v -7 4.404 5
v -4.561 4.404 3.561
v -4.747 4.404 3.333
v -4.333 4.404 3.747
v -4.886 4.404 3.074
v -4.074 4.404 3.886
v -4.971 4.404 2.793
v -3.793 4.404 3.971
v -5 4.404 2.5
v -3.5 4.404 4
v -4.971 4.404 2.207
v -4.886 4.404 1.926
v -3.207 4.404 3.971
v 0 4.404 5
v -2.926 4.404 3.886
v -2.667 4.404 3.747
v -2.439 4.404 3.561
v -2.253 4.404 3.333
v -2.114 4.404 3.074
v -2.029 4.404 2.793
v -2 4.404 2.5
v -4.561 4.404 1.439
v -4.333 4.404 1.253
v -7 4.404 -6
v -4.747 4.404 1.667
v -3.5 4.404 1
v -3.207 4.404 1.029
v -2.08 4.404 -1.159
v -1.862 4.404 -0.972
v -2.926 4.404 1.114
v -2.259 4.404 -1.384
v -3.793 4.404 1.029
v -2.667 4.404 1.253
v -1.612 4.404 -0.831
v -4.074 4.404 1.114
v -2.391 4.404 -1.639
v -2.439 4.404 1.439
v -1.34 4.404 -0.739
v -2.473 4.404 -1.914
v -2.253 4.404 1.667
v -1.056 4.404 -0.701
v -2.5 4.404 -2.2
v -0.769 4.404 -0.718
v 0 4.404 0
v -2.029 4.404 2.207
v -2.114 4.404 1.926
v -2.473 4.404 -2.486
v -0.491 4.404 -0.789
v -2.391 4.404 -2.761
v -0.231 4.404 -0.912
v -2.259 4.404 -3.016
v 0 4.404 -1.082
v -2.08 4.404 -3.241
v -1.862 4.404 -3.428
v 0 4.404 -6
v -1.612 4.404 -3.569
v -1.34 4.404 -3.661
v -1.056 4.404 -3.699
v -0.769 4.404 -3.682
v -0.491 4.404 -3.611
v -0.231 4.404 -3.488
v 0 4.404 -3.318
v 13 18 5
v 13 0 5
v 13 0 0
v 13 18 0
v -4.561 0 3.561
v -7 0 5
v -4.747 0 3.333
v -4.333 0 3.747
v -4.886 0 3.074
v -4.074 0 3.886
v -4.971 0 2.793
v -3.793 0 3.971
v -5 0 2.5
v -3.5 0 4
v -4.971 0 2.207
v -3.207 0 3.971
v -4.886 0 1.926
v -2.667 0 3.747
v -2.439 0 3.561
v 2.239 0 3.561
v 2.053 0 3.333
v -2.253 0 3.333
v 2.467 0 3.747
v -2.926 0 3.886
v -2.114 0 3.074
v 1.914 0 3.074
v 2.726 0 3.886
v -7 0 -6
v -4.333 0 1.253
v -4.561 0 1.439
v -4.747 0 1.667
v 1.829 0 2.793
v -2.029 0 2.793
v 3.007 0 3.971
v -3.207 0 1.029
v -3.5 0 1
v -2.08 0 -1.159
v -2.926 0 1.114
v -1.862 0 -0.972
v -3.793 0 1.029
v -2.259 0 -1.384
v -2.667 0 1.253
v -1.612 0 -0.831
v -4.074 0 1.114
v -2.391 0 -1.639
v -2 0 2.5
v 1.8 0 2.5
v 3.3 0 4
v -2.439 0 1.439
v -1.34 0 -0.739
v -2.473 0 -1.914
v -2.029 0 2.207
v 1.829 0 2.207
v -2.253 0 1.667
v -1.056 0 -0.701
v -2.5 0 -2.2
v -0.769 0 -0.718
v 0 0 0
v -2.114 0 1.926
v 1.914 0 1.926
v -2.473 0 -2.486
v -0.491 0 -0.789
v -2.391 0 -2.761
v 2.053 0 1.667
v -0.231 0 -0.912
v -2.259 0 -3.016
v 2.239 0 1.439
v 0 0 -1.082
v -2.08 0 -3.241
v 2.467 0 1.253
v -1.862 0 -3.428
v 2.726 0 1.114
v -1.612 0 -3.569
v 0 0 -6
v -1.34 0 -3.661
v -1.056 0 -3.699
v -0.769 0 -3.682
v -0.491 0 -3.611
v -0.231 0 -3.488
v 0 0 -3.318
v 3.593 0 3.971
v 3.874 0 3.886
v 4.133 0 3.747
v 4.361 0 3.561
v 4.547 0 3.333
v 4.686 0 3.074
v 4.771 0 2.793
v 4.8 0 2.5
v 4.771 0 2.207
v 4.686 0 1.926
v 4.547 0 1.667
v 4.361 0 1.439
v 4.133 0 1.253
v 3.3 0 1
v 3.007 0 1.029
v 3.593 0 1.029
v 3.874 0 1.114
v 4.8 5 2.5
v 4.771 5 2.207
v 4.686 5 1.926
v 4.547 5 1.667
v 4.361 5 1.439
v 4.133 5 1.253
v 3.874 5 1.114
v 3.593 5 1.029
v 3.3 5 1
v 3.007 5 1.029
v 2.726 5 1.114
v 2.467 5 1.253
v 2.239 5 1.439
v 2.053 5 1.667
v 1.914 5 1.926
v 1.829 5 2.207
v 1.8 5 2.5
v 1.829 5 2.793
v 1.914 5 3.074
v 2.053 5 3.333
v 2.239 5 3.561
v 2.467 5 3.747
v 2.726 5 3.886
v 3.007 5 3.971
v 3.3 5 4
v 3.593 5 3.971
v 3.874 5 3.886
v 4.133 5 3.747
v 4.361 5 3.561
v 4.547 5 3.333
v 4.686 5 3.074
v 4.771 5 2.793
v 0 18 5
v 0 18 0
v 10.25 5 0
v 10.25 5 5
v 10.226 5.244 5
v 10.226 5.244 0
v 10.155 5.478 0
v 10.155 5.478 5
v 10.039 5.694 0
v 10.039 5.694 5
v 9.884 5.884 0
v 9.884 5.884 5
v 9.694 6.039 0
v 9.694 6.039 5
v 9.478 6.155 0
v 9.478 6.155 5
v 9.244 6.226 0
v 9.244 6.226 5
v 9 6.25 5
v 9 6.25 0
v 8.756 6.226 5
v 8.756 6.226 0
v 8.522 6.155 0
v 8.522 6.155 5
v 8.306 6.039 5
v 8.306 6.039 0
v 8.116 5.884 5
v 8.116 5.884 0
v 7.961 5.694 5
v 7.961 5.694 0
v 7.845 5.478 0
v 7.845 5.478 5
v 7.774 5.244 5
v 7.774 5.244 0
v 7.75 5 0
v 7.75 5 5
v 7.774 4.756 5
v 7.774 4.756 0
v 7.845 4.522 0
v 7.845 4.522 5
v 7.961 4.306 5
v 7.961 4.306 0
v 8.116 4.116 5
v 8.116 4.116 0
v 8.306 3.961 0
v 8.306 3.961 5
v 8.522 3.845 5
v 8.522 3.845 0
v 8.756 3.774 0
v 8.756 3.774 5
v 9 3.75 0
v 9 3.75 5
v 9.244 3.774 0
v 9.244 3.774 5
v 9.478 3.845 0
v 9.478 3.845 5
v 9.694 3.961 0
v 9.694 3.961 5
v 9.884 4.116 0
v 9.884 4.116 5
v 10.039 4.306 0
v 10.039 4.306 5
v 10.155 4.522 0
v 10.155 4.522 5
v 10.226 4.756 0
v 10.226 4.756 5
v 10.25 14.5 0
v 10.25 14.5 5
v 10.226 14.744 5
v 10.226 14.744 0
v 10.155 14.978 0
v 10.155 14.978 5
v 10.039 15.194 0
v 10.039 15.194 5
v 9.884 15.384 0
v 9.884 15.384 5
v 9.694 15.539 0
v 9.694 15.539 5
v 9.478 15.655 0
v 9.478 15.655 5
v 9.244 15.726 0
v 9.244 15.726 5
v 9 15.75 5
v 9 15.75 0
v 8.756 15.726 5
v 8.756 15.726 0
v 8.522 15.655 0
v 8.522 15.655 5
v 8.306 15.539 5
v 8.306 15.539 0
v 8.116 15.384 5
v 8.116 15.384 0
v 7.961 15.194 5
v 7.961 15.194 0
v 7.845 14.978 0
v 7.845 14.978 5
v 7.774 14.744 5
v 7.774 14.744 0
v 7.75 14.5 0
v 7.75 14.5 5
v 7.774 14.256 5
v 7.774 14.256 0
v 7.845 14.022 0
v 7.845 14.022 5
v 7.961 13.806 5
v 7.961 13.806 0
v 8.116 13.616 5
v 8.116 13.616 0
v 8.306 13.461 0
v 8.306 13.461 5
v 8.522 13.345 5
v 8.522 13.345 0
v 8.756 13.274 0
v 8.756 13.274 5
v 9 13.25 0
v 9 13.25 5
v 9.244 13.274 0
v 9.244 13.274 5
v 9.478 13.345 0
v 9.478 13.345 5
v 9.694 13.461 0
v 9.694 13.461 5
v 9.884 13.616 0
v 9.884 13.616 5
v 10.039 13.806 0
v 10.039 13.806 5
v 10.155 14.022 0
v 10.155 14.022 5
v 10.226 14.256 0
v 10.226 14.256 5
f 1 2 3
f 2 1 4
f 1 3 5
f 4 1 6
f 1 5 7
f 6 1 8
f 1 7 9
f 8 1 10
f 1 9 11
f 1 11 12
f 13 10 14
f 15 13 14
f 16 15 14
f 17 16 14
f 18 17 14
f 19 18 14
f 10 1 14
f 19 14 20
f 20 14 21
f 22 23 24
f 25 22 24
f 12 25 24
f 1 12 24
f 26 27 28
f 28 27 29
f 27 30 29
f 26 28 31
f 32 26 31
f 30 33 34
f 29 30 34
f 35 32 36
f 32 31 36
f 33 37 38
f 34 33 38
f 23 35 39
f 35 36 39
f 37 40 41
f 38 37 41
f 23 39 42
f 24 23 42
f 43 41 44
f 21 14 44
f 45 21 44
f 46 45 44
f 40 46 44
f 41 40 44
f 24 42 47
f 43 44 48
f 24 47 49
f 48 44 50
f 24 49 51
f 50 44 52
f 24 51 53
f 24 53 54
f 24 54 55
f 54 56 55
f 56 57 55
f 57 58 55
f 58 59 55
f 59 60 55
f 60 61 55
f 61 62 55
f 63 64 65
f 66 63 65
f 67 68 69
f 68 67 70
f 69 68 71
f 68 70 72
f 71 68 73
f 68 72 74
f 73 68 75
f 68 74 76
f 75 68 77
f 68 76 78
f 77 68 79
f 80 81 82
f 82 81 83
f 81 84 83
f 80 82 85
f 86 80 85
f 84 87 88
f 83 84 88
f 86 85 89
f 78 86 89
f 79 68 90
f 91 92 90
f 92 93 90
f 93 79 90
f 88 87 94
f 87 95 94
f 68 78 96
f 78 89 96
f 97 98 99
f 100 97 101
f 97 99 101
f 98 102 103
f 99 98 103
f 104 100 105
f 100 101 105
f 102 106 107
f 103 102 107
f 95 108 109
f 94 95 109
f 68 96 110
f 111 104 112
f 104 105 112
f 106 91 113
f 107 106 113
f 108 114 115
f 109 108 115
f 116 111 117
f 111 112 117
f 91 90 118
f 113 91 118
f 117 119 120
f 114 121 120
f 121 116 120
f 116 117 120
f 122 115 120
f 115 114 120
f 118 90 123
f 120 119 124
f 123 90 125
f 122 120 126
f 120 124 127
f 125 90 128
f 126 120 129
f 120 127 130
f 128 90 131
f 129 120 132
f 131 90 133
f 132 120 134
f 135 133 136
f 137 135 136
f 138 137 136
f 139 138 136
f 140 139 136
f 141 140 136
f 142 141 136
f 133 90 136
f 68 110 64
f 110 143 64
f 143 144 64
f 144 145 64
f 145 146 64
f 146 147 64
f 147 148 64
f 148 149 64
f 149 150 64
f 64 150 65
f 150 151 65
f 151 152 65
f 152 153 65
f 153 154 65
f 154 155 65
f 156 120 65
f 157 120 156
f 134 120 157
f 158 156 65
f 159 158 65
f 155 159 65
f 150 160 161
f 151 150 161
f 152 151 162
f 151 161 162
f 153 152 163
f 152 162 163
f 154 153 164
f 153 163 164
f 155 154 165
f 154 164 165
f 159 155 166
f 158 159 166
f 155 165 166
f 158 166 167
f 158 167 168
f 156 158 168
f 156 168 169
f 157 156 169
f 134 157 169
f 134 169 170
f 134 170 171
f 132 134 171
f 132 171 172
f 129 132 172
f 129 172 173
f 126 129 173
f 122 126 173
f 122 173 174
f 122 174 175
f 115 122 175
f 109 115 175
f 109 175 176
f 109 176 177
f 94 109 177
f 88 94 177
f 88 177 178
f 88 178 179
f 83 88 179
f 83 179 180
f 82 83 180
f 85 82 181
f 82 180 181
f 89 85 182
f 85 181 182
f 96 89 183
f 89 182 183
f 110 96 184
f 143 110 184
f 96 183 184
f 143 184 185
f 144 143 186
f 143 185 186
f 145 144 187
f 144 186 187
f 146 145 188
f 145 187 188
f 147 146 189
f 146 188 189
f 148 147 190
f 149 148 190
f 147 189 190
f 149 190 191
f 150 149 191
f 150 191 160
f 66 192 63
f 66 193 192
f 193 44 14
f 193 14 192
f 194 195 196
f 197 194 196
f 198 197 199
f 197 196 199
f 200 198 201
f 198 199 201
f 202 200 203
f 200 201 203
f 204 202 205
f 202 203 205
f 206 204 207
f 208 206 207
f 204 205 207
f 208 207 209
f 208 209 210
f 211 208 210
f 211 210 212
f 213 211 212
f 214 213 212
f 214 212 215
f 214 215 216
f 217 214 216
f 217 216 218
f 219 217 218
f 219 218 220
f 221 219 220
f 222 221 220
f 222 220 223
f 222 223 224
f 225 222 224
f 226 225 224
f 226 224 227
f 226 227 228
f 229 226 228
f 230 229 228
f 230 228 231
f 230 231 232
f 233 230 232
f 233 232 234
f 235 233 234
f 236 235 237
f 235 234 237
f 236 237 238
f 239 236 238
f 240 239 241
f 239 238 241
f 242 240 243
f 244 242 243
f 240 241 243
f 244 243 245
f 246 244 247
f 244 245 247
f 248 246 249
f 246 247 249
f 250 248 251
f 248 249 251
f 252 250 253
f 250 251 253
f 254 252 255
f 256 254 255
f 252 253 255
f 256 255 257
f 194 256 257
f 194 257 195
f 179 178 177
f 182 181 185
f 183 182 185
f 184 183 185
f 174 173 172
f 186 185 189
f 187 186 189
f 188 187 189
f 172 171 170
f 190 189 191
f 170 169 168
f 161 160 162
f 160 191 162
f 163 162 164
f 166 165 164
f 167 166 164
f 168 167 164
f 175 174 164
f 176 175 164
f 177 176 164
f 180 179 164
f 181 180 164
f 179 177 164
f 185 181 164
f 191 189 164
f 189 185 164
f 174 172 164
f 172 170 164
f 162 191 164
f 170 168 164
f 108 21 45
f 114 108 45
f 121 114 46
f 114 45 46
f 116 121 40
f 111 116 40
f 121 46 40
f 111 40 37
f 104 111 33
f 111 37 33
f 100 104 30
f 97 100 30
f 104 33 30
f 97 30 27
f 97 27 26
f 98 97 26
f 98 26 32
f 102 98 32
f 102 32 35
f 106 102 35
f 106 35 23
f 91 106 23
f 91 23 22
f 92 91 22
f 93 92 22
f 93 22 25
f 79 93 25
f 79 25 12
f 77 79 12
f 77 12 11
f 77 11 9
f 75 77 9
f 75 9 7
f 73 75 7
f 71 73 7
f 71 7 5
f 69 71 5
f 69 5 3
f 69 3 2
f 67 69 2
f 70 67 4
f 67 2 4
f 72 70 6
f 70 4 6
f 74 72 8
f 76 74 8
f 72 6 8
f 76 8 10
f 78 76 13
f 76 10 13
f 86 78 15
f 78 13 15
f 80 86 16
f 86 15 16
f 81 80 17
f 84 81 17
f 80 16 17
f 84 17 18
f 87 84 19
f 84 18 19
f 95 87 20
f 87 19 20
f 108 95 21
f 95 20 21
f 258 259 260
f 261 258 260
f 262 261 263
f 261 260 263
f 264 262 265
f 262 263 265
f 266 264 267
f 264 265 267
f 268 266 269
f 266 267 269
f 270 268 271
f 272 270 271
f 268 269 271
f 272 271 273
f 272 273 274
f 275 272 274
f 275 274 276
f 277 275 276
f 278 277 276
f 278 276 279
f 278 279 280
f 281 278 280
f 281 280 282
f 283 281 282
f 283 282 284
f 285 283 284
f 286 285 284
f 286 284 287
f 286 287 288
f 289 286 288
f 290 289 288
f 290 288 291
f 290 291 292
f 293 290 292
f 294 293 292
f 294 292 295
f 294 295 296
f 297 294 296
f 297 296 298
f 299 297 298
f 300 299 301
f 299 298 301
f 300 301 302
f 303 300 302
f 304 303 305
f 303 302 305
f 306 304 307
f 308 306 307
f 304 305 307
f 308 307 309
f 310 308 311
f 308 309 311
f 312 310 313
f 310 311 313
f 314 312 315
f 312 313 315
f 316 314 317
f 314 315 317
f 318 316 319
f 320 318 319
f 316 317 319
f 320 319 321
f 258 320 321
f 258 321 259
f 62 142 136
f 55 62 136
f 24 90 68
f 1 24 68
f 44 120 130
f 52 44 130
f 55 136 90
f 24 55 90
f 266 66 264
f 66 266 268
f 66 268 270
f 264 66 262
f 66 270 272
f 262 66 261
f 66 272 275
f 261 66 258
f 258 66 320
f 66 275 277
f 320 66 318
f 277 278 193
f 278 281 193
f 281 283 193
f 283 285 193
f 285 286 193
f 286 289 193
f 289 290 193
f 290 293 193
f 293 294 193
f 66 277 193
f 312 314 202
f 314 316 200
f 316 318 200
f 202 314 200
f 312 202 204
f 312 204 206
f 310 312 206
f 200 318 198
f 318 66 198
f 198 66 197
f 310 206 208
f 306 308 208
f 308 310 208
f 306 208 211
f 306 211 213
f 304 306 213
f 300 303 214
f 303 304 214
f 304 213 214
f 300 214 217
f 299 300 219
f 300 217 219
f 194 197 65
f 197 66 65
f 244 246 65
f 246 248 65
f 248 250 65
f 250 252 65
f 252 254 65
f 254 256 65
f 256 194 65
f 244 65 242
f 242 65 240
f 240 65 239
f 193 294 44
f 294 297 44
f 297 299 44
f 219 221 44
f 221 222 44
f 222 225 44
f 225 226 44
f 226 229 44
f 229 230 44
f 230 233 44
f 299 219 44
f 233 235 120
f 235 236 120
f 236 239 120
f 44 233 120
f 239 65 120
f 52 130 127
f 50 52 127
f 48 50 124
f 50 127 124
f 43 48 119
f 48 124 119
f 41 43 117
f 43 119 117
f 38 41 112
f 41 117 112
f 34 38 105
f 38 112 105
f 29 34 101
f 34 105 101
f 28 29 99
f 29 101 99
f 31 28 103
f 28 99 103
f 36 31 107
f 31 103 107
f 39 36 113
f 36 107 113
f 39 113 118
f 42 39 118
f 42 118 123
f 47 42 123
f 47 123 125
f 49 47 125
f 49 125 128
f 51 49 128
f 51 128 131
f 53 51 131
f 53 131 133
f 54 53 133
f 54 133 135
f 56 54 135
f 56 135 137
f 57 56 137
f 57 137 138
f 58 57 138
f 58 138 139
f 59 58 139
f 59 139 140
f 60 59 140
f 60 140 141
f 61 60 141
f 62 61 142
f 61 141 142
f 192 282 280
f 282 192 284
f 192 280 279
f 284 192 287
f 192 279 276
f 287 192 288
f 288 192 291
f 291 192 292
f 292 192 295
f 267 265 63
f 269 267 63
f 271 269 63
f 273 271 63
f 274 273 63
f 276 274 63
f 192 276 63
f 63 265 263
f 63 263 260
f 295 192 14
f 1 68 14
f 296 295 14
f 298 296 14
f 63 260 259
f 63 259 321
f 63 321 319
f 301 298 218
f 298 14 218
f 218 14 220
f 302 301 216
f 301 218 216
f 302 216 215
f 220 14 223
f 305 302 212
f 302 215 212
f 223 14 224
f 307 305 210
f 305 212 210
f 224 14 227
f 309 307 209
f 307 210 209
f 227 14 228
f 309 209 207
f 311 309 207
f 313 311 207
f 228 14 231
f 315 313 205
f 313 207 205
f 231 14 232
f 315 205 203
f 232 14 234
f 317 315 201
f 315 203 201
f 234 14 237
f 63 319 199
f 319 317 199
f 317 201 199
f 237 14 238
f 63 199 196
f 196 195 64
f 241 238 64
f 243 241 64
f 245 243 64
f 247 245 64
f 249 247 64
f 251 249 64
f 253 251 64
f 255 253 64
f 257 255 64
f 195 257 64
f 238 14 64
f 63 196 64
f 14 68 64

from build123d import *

# Parameters (mm, degrees)
BOSS_EXTRUDE1_DEPTH             = 18
SKETCH2_W                       = 6
SKETCH2_H                       = 13.595638642
CUT_EXTRUDE1_DEPTH              = 10
SKETCH3_W                       = 7
SKETCH3_H                       = 13.595638642
CUT_EXTRUDE2_DEPTH              = 10
SKETCH4_R                       = 1.5
CUT_EXTRUDE3_DEPTH              = 10
TAP_DRILL_FOR_M3X0_5_TAP1_D     = 3
TAP_DRILL_FOR_M3X0_5_TAP1_DEPTH = 5
F_2_5_2_5_DIAMETER_HOLE1_D      = 2.5
F_2_5_2_5_DIAMETER_HOLE1_DEPTH  = 6.5


with BuildPart() as part:
    # Sketch1 → Boss-Extrude1 (new body)
    with BuildSketch(Plane(origin=(0, 0, 0), x_dir=(1, 0, 0), z_dir=(0, 1, 0))):
        Polygon((0, 0), (0, 6), (-7, 6), (-7, -5), (13, -5), (13, 0), align=None)
    extrude(amount=BOSS_EXTRUDE1_DEPTH)

    # Sketch2 → Cut-Extrude1 (cut)
    with BuildSketch(Plane(origin=(0, 0, 0), x_dir=(0, 0, -1), z_dir=(1, 0, 0))):
        with Locations((3, 11.202180679)):
            Rectangle(SKETCH2_W, SKETCH2_H)
    extrude(amount=-CUT_EXTRUDE1_DEPTH, mode=Mode.SUBTRACT)

    # Sketch3 → Cut-Extrude2 (cut)
    with BuildSketch(Plane(origin=(0, 0, 0), x_dir=(-1, 0, 0), z_dir=(0, 0, -1))):
        with Locations((3.5, 11.202180679)):
            Rectangle(SKETCH3_W, SKETCH3_H)
    extrude(amount=-CUT_EXTRUDE2_DEPTH, mode=Mode.SUBTRACT)

    # Sketch4 → Cut-Extrude3 (cut)
    with BuildSketch(Plane.XZ):
        with Locations((-1, -2.2)):
            Circle(SKETCH4_R)
    extrude(amount=-CUT_EXTRUDE3_DEPTH, mode=Mode.SUBTRACT)

    # Tap Drill for M3x0.5 Tap1
    with Locations(Plane(origin=(0, 0, 0), x_dir=(-1, 0, 0), z_dir=(0, -1, 0))):
        with Locations((-3.3, -2.5), (3.5, -2.5)):
            Hole(TAP_DRILL_FOR_M3X0_5_TAP1_D / 2, depth=TAP_DRILL_FOR_M3X0_5_TAP1_DEPTH)

    # Ø2.5 (2.5) Diameter Hole1
    with Locations(Plane(origin=(0, 0, 0), x_dir=(-1, 0, 0), z_dir=(0, 0, -1))):
        with Locations((-9, 14.5), (-9, 5)):
            Hole(F_2_5_2_5_DIAMETER_HOLE1_D / 2, depth=F_2_5_2_5_DIAMETER_HOLE1_DEPTH)


solid = part.part
